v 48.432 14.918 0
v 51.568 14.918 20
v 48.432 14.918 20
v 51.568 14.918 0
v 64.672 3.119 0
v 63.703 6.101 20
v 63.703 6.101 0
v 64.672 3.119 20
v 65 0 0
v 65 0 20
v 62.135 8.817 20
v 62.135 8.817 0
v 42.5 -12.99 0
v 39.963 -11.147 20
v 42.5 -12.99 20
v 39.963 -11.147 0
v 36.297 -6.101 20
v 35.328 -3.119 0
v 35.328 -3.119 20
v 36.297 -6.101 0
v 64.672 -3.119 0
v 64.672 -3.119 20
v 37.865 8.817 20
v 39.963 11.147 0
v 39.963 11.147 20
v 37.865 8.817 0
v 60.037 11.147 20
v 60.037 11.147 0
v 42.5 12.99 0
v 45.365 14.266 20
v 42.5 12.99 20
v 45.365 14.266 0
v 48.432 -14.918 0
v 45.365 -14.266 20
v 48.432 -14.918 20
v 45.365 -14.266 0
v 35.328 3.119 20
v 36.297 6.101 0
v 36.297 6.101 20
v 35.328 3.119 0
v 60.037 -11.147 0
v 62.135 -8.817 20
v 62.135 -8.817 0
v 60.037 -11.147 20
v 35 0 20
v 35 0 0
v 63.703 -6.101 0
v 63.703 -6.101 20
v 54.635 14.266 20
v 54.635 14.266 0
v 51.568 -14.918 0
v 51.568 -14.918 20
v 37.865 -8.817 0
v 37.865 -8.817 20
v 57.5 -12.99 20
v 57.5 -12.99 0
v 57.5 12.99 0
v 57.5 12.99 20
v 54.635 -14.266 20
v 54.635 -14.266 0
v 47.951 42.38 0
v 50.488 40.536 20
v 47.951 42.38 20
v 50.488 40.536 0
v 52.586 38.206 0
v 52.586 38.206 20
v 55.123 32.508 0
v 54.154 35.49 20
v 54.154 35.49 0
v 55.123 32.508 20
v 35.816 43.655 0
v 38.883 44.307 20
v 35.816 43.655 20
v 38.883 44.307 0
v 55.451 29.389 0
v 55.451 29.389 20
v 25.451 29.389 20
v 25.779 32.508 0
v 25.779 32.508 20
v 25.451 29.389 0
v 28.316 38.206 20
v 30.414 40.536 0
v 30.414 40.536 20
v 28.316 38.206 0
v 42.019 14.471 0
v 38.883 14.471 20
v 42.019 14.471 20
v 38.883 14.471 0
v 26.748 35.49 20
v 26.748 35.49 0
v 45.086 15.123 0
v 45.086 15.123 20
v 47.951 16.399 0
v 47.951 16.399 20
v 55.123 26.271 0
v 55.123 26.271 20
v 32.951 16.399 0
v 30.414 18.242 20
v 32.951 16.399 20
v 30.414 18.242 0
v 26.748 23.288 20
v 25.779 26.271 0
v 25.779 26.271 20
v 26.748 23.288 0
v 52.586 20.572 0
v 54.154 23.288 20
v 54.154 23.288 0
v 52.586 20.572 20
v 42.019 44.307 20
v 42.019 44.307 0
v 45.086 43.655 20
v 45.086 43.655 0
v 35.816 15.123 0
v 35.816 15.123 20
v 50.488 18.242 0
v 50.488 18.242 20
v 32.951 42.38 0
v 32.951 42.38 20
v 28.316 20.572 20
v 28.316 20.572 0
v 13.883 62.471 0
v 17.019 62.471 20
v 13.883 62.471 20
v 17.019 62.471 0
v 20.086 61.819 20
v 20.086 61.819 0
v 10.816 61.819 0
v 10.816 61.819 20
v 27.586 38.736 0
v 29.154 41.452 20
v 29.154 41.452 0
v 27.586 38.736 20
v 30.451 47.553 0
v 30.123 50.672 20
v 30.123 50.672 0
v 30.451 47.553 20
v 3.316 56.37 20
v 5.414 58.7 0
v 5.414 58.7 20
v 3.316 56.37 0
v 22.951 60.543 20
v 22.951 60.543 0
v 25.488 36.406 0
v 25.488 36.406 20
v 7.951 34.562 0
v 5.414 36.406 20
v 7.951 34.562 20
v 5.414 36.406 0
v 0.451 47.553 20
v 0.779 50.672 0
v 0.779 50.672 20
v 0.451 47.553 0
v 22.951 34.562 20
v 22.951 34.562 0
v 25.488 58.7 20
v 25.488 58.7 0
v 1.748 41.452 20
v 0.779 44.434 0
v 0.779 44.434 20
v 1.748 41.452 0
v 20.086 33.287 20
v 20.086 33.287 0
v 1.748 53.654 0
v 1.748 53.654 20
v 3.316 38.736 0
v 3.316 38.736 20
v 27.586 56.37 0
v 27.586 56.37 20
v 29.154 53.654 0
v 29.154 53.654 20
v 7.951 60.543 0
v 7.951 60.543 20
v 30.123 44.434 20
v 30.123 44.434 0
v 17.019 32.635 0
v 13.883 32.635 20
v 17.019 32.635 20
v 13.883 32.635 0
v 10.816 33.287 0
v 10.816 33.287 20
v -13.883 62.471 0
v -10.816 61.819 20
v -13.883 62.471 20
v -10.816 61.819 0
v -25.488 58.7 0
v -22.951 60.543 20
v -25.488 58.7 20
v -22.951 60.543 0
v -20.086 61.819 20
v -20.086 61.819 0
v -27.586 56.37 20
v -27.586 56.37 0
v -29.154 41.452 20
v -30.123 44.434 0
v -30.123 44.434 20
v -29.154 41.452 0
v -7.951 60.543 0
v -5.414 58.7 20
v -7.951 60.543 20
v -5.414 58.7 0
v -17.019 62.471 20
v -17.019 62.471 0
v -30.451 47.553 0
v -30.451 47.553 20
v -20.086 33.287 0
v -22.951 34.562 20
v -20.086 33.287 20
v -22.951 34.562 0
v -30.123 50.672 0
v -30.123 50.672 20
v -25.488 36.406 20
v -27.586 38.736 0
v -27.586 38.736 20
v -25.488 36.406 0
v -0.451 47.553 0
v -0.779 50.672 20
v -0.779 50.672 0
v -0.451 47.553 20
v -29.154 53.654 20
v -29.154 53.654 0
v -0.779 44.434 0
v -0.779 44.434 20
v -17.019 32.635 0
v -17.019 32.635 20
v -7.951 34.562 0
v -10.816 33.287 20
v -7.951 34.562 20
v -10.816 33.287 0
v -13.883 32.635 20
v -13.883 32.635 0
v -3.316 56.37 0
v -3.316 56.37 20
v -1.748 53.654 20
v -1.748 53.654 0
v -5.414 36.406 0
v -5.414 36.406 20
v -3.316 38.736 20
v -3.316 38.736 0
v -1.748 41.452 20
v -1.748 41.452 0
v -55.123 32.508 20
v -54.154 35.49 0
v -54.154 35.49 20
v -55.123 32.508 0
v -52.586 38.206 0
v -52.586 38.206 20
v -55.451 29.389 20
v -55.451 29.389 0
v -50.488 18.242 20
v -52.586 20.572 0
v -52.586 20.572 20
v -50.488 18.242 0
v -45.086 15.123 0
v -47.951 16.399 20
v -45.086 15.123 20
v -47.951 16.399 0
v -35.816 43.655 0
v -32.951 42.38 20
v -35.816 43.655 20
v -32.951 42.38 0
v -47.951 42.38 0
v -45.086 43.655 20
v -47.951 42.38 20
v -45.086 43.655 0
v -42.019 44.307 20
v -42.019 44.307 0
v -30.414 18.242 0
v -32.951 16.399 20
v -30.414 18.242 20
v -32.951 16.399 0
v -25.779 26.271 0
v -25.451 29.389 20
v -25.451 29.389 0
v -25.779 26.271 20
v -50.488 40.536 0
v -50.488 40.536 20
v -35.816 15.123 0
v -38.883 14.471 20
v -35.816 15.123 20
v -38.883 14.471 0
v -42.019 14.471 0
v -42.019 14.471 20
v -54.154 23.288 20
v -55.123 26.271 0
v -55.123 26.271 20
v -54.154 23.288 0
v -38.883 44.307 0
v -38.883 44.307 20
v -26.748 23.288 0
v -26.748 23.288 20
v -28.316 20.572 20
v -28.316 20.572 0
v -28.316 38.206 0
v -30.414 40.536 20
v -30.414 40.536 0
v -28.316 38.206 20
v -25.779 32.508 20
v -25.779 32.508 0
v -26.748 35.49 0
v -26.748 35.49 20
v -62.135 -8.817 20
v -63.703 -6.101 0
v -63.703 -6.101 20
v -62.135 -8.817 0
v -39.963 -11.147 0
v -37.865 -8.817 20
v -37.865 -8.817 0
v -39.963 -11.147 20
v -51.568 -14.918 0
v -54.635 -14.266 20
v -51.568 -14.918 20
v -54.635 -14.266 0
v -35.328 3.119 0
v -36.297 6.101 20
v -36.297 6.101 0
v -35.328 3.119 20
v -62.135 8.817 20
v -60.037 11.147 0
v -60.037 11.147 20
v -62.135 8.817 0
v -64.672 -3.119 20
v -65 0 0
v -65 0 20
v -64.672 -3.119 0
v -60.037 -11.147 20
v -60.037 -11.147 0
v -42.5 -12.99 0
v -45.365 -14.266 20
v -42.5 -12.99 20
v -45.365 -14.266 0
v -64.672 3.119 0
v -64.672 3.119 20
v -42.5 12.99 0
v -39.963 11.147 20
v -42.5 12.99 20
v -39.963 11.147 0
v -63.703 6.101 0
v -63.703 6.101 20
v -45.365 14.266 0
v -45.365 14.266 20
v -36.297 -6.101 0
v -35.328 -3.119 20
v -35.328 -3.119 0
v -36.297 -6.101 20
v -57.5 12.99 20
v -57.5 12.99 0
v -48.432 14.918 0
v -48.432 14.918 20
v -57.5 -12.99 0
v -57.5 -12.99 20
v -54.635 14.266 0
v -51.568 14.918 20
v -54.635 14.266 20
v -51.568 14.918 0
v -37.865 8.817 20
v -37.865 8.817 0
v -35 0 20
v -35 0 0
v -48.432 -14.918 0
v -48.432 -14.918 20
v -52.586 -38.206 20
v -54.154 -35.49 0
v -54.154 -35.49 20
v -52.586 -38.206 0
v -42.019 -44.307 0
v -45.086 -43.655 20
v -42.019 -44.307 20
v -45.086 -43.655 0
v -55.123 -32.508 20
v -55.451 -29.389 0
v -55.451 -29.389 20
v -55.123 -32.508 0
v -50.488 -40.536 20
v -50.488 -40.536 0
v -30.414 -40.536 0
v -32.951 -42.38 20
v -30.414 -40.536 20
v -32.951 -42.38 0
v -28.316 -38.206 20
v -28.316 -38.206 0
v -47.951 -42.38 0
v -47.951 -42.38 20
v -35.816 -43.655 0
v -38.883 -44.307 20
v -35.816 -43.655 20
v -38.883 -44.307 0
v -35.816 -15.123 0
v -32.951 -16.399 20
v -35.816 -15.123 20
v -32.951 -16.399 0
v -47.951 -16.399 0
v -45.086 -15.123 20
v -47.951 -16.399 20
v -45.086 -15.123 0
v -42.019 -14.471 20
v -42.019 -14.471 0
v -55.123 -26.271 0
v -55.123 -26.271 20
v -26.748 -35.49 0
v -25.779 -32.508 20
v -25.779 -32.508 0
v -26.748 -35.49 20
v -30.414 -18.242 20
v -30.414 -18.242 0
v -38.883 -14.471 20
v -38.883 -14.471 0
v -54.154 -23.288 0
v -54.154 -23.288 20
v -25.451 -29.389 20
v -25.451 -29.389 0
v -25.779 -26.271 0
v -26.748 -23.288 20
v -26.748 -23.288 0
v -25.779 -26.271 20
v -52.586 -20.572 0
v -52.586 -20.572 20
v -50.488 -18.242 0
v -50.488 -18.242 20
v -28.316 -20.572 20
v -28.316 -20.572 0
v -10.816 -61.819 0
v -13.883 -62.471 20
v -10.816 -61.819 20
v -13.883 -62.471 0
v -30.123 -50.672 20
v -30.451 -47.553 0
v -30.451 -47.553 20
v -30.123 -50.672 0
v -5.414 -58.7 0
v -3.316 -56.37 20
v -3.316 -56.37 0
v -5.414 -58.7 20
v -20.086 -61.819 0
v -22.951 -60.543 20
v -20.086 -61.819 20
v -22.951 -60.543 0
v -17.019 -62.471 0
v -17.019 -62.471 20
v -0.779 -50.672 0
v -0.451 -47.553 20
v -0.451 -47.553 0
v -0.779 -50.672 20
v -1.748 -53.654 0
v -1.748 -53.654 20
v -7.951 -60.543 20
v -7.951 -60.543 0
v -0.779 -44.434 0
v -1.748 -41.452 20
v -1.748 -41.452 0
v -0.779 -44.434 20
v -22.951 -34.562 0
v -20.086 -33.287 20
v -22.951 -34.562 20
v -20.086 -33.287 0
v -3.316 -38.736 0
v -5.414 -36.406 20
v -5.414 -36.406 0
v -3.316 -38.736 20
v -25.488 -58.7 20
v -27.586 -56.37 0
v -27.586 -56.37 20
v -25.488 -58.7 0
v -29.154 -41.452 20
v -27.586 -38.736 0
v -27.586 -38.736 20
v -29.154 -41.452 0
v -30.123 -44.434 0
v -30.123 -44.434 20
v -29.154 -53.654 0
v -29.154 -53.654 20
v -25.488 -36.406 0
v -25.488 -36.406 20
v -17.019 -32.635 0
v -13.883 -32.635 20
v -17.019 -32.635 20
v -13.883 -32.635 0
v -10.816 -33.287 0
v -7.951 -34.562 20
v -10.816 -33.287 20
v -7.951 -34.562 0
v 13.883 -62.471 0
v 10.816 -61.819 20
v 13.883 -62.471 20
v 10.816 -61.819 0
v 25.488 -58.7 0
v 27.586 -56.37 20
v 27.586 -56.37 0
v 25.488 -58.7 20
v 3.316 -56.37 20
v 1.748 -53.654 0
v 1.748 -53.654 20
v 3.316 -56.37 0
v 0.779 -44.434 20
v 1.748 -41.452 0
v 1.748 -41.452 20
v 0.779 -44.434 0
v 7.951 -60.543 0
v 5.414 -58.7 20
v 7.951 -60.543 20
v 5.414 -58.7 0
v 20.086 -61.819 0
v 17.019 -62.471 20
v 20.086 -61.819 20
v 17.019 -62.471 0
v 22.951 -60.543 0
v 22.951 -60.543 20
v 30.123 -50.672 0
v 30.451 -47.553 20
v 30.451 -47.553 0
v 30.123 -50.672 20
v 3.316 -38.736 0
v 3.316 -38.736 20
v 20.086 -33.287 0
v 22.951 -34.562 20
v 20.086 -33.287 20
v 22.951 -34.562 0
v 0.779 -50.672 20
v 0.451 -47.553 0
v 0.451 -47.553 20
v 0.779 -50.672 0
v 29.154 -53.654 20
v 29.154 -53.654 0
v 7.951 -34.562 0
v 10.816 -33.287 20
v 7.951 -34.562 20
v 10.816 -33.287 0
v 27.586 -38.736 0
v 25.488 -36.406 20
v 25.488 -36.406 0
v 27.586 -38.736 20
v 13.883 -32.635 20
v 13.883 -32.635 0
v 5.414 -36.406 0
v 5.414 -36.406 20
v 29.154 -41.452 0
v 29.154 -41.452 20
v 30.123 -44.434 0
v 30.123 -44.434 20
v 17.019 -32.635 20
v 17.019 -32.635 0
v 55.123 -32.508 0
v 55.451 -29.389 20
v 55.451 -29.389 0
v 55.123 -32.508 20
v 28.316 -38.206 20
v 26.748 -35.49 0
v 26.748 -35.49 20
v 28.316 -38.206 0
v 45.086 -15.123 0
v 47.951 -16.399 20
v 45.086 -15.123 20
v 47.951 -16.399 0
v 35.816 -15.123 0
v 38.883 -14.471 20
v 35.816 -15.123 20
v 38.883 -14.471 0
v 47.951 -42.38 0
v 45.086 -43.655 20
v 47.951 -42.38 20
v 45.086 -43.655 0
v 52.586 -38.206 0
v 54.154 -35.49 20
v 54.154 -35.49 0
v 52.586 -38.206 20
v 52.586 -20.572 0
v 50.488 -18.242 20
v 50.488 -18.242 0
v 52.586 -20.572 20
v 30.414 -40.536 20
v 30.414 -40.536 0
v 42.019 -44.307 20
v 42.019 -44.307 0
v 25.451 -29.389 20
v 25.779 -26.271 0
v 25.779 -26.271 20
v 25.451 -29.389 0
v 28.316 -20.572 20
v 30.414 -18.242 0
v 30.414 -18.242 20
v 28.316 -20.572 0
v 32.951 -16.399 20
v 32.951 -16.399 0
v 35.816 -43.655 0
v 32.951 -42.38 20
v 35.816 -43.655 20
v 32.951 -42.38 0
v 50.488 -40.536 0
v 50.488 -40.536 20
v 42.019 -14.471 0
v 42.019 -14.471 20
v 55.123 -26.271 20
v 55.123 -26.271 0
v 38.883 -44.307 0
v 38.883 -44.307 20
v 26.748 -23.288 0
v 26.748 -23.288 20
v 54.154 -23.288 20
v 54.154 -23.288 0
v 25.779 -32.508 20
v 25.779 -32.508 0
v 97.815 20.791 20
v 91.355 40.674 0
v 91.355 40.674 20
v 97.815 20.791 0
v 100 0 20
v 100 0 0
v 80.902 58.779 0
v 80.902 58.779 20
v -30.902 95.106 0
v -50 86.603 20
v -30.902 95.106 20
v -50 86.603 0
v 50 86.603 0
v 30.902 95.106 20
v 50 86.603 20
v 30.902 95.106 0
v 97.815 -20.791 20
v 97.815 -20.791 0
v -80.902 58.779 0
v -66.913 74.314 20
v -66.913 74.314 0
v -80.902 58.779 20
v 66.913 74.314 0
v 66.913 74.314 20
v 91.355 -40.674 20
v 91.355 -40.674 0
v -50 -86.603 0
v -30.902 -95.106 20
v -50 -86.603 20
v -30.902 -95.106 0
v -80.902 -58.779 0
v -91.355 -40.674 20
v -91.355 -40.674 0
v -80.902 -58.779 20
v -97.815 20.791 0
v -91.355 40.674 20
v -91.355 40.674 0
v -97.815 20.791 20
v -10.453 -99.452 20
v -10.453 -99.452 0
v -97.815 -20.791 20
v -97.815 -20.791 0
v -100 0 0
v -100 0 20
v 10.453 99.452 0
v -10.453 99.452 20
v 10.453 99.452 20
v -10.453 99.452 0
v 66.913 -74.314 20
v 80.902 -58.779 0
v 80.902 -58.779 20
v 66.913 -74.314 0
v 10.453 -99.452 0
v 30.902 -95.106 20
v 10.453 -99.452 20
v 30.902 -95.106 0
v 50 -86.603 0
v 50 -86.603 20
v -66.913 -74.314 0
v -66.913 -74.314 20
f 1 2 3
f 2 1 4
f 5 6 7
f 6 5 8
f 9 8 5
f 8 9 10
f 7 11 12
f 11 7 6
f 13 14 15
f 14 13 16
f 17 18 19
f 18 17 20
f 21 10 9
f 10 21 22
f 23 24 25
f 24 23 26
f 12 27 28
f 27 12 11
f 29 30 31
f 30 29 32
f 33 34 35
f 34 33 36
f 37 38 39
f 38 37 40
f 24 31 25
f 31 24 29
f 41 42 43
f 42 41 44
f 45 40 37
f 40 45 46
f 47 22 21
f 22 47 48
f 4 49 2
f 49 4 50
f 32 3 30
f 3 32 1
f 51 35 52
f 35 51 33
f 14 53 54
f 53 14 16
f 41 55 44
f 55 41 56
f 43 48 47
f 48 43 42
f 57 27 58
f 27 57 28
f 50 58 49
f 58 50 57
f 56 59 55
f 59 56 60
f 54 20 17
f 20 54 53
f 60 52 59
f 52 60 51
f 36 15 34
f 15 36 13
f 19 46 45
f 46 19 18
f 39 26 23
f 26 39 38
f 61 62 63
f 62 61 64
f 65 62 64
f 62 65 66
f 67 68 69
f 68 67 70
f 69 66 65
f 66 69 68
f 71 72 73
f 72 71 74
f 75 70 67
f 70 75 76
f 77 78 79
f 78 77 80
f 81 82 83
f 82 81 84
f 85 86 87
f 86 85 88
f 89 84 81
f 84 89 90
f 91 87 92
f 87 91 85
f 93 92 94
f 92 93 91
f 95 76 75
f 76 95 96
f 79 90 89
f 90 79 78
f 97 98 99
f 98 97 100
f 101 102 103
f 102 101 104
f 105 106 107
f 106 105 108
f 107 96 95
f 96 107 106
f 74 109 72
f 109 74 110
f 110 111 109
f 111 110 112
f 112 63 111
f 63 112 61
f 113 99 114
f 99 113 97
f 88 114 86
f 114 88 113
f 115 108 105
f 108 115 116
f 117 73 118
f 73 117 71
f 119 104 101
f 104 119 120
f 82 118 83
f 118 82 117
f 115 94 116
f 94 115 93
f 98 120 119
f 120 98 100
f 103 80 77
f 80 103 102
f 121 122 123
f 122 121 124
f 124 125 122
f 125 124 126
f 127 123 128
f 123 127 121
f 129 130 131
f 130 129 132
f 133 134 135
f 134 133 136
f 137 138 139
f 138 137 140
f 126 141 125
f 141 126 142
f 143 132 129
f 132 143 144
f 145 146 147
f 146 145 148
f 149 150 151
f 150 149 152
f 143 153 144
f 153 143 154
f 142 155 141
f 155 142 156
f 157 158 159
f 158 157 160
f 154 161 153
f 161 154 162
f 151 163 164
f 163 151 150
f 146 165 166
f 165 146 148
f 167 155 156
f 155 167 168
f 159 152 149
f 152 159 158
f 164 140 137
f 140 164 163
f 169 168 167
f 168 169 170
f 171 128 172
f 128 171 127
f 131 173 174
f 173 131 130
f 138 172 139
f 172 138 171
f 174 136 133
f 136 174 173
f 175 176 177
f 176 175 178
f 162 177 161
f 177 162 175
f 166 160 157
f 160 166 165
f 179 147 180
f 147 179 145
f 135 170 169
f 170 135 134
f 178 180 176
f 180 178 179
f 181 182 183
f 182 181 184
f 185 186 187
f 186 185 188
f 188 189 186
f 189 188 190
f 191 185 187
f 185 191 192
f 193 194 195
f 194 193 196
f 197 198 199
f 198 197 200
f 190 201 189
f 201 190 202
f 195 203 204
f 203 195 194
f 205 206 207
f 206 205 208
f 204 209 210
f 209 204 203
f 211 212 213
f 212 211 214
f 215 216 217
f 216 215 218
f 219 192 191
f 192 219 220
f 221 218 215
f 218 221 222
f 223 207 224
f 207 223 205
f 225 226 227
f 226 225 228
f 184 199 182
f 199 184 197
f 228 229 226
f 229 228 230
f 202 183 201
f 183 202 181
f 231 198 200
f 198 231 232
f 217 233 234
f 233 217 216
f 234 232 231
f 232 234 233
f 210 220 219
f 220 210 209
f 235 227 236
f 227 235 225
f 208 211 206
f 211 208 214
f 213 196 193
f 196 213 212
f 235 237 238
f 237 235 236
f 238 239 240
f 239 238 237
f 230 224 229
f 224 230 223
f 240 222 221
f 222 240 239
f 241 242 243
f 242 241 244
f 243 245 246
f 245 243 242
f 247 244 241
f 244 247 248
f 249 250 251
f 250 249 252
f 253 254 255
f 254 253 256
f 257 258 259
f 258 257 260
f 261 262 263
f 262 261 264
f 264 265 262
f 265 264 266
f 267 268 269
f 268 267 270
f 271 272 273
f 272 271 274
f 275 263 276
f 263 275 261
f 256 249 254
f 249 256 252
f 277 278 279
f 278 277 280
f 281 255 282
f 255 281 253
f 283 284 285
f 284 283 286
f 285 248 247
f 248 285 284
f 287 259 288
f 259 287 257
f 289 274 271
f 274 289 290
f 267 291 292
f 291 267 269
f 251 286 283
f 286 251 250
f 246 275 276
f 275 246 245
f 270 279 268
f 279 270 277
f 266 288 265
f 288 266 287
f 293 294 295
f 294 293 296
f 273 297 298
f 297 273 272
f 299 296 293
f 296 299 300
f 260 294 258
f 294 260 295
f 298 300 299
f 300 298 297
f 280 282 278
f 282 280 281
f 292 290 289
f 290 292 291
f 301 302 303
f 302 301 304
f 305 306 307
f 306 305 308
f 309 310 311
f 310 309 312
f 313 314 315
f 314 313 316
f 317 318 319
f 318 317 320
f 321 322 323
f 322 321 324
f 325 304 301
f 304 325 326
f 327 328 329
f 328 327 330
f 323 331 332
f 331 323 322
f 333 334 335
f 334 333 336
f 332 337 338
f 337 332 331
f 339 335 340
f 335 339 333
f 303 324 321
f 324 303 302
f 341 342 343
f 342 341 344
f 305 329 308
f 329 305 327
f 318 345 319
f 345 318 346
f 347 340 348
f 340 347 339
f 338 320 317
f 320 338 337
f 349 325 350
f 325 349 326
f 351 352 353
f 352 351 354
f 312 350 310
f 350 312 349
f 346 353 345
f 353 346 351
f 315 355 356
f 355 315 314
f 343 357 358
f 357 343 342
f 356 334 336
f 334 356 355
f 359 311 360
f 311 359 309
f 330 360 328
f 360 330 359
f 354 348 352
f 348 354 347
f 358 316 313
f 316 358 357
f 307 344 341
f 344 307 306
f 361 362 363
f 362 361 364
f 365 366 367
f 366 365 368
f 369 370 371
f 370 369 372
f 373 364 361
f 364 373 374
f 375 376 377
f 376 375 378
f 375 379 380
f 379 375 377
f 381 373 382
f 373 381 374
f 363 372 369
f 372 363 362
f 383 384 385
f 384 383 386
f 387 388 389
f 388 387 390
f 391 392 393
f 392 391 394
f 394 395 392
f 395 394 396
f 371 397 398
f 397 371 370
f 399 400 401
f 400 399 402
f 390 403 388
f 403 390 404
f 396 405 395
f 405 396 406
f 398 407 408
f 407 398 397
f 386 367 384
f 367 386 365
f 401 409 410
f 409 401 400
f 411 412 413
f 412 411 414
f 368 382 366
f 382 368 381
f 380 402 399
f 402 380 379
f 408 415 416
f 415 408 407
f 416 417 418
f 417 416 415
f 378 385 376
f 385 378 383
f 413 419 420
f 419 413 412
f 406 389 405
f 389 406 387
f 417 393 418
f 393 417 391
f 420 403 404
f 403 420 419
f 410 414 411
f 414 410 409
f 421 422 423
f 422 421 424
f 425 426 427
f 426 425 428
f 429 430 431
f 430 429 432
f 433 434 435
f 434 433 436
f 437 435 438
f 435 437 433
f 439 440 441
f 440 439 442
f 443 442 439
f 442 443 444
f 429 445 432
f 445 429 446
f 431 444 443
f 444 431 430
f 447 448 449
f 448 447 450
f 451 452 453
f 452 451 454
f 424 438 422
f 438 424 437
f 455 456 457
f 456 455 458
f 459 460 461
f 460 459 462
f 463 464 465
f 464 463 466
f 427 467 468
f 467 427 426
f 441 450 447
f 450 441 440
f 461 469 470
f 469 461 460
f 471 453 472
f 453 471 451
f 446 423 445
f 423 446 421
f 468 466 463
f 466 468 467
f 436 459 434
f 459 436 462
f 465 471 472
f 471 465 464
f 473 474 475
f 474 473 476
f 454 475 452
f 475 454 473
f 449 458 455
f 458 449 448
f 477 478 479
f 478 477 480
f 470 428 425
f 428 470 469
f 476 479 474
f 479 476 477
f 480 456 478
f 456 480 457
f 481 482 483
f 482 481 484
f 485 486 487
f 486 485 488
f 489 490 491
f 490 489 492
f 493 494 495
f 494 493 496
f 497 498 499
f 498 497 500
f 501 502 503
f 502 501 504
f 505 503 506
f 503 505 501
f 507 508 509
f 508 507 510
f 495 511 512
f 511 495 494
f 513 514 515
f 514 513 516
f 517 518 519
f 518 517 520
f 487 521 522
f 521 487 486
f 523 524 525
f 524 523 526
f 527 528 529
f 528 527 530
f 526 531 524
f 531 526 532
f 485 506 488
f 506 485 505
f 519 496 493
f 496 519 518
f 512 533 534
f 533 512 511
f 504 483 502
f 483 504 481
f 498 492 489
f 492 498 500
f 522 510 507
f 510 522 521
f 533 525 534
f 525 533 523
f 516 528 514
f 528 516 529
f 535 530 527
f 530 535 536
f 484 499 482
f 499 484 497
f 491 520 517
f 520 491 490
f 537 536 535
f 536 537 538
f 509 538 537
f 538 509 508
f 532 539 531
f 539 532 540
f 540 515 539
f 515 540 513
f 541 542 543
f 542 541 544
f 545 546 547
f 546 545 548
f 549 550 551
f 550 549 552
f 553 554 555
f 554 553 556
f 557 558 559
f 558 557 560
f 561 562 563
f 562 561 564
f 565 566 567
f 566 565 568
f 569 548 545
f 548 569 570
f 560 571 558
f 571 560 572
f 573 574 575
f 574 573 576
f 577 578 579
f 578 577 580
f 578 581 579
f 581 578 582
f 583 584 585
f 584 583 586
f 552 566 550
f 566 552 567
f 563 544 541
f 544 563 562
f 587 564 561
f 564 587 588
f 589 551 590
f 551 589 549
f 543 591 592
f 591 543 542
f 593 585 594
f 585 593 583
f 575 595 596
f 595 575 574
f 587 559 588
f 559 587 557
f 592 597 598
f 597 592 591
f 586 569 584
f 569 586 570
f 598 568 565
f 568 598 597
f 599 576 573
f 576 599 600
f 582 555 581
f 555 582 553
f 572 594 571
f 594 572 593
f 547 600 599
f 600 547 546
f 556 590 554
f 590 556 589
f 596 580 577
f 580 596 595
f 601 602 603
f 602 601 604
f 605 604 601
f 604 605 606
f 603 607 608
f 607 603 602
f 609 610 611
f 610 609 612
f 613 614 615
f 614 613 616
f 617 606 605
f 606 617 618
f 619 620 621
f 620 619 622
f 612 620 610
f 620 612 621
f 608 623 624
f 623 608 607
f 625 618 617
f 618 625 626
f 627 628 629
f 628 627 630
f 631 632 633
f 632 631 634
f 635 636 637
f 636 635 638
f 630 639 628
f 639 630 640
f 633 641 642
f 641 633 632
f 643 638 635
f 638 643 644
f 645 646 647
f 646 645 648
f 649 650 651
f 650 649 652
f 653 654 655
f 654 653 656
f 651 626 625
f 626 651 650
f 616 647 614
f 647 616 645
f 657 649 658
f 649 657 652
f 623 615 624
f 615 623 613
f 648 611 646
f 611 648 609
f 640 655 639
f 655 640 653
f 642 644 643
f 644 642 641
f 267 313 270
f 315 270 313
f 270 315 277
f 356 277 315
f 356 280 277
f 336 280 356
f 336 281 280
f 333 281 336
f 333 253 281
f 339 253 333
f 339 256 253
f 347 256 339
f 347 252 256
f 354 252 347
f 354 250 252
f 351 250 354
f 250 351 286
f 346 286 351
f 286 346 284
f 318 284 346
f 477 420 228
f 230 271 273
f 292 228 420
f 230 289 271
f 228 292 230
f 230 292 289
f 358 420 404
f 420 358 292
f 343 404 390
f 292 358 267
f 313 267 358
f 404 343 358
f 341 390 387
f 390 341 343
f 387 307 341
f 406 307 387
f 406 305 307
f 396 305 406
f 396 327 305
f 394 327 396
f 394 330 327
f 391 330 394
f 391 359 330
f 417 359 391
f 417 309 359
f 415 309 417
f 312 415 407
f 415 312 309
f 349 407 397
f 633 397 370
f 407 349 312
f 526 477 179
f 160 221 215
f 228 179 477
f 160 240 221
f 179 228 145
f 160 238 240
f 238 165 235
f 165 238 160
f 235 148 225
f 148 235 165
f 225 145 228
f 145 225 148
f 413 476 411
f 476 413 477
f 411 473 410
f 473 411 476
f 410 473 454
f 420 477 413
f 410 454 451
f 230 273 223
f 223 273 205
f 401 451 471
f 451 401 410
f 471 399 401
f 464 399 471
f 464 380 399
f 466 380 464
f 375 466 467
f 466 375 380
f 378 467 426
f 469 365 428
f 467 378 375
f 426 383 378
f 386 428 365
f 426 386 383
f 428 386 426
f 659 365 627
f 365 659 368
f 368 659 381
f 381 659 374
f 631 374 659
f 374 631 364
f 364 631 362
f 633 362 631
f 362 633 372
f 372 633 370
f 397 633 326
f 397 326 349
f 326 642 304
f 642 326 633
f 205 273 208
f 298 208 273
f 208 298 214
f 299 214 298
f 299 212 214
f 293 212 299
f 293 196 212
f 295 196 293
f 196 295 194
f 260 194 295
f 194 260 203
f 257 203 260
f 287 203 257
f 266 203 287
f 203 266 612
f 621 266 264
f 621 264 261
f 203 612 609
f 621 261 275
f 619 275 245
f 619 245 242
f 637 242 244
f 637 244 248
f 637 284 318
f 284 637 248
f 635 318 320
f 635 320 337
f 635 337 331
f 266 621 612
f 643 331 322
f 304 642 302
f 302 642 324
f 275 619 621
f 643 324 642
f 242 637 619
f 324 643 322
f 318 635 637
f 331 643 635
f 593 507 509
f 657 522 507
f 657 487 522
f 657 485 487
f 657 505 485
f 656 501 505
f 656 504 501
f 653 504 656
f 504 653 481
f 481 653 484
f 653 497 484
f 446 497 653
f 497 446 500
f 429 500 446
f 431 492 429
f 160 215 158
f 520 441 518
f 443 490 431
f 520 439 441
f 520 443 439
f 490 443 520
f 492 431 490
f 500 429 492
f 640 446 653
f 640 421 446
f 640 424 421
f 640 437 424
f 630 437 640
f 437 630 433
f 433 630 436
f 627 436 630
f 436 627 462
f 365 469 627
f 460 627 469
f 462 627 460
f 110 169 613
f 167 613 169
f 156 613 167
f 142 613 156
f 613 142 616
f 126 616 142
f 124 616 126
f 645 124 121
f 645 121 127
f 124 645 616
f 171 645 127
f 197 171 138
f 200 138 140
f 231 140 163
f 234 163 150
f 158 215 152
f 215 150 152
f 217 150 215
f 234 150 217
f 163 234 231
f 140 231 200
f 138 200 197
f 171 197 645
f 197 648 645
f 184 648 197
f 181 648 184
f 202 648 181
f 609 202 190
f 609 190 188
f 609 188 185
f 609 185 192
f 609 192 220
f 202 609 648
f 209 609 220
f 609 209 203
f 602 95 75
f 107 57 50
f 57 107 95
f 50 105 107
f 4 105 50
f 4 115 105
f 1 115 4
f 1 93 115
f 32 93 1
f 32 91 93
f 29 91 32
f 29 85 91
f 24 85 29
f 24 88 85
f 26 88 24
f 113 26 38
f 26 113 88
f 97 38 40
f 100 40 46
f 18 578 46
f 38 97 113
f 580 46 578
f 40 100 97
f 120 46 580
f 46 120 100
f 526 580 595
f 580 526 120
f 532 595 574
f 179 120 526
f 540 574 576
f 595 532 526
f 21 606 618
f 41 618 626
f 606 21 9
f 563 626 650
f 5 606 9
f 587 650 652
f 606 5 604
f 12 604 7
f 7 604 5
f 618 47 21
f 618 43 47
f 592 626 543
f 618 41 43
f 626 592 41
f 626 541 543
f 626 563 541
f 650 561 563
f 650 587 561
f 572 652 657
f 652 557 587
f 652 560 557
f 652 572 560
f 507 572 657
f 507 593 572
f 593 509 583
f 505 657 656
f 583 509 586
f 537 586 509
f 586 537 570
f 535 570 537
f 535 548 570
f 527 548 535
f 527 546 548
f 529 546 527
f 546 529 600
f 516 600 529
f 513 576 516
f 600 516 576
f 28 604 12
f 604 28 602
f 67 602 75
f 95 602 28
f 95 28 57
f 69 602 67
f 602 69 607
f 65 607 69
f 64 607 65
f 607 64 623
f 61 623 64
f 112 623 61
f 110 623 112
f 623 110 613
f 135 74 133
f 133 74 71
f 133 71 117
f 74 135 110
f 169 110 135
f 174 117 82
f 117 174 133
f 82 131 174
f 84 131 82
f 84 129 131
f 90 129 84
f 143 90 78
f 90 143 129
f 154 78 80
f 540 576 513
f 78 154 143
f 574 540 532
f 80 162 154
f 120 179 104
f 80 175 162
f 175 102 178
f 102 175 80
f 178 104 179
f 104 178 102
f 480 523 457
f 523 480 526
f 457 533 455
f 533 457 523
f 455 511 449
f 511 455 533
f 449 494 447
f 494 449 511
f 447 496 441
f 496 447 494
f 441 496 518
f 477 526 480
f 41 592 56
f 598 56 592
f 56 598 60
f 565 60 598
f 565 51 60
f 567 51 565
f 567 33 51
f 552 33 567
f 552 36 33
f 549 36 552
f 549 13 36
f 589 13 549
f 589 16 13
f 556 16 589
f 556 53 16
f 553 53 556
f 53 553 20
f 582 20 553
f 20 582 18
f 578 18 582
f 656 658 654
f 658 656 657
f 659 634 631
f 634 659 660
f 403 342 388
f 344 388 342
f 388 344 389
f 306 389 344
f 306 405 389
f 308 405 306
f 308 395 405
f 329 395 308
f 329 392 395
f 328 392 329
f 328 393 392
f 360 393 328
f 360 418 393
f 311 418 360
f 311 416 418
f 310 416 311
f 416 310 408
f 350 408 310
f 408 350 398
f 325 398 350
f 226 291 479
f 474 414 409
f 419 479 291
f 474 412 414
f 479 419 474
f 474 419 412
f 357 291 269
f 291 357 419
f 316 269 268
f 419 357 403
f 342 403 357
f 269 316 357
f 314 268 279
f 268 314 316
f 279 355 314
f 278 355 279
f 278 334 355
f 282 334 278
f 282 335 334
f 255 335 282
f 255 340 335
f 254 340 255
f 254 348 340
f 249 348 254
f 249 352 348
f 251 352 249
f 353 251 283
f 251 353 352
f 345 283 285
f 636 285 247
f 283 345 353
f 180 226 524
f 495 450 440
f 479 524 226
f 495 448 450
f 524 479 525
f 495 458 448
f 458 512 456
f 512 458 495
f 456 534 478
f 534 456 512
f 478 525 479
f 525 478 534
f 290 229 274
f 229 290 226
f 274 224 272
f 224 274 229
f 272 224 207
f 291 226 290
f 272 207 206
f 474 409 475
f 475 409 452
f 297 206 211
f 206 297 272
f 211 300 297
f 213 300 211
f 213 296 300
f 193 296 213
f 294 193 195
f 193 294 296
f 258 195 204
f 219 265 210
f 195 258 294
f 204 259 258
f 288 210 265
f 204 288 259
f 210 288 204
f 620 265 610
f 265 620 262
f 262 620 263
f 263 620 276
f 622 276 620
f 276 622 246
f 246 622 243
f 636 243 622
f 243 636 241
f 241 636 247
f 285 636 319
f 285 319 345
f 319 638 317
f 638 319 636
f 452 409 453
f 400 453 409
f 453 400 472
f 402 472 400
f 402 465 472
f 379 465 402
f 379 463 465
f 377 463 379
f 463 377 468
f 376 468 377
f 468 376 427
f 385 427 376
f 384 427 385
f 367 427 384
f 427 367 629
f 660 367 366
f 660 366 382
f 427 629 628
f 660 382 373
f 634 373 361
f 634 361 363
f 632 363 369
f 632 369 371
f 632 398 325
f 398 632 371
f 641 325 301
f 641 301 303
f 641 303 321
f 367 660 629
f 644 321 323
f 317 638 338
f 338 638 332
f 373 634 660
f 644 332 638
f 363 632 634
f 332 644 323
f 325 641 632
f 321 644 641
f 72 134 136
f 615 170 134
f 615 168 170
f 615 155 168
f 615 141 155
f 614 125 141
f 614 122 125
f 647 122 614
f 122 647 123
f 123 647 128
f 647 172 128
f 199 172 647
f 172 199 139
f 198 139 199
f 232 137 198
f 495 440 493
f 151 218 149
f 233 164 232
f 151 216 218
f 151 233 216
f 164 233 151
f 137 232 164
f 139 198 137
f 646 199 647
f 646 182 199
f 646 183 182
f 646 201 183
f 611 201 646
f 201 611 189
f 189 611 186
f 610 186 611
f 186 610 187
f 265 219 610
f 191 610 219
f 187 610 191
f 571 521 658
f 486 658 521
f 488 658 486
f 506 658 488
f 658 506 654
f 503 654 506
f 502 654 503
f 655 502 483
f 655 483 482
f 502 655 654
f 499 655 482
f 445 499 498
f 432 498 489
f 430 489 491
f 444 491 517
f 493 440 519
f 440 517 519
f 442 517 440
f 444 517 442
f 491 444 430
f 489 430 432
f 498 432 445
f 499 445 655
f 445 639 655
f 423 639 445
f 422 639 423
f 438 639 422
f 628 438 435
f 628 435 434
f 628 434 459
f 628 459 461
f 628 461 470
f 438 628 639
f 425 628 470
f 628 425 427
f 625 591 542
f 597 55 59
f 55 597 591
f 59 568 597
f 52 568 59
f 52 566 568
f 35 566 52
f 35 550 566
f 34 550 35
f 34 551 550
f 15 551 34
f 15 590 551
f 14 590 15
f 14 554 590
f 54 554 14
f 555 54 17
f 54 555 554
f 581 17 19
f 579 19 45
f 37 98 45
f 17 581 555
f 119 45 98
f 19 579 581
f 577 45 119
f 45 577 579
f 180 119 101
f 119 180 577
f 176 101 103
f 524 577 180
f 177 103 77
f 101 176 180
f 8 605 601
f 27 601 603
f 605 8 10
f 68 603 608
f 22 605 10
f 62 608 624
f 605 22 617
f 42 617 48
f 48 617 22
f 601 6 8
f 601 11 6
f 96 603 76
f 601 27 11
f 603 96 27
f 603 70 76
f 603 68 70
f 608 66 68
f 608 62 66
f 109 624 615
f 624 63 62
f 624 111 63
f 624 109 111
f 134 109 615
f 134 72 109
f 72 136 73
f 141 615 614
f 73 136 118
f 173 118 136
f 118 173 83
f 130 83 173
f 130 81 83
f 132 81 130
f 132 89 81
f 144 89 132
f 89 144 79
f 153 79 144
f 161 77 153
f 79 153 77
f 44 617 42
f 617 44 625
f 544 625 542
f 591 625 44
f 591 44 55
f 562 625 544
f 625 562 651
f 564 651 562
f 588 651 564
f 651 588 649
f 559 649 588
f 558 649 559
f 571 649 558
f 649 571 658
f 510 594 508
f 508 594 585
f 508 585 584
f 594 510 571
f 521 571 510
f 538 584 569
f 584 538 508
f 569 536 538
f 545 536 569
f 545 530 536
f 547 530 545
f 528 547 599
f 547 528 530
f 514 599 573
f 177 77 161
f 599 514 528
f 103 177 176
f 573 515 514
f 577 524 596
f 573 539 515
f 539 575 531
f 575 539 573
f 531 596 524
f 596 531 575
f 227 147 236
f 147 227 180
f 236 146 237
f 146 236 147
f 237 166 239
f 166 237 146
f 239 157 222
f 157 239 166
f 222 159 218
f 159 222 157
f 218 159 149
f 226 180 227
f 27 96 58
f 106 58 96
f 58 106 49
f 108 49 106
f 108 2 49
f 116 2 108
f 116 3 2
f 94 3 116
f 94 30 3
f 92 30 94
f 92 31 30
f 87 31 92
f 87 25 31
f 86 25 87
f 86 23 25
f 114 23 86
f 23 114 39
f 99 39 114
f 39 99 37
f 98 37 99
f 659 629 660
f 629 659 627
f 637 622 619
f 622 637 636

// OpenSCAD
module roata(raza,grosime,raza_gaura,nr_gauri)
{
    difference(){
      cylinder(h=grosime,r=raza);
        for(i=[0:360/nr_gauri:359])  
          rotate([0,0,i])
             translate([raza/2,0,-1])
      cylinder(r=raza_gaura,h=grosime+2);
    }
}
rotate([0,0,$t*360])
roata(raza=100,grosime=20,raza_gaura=15,nr_gauri=10);
